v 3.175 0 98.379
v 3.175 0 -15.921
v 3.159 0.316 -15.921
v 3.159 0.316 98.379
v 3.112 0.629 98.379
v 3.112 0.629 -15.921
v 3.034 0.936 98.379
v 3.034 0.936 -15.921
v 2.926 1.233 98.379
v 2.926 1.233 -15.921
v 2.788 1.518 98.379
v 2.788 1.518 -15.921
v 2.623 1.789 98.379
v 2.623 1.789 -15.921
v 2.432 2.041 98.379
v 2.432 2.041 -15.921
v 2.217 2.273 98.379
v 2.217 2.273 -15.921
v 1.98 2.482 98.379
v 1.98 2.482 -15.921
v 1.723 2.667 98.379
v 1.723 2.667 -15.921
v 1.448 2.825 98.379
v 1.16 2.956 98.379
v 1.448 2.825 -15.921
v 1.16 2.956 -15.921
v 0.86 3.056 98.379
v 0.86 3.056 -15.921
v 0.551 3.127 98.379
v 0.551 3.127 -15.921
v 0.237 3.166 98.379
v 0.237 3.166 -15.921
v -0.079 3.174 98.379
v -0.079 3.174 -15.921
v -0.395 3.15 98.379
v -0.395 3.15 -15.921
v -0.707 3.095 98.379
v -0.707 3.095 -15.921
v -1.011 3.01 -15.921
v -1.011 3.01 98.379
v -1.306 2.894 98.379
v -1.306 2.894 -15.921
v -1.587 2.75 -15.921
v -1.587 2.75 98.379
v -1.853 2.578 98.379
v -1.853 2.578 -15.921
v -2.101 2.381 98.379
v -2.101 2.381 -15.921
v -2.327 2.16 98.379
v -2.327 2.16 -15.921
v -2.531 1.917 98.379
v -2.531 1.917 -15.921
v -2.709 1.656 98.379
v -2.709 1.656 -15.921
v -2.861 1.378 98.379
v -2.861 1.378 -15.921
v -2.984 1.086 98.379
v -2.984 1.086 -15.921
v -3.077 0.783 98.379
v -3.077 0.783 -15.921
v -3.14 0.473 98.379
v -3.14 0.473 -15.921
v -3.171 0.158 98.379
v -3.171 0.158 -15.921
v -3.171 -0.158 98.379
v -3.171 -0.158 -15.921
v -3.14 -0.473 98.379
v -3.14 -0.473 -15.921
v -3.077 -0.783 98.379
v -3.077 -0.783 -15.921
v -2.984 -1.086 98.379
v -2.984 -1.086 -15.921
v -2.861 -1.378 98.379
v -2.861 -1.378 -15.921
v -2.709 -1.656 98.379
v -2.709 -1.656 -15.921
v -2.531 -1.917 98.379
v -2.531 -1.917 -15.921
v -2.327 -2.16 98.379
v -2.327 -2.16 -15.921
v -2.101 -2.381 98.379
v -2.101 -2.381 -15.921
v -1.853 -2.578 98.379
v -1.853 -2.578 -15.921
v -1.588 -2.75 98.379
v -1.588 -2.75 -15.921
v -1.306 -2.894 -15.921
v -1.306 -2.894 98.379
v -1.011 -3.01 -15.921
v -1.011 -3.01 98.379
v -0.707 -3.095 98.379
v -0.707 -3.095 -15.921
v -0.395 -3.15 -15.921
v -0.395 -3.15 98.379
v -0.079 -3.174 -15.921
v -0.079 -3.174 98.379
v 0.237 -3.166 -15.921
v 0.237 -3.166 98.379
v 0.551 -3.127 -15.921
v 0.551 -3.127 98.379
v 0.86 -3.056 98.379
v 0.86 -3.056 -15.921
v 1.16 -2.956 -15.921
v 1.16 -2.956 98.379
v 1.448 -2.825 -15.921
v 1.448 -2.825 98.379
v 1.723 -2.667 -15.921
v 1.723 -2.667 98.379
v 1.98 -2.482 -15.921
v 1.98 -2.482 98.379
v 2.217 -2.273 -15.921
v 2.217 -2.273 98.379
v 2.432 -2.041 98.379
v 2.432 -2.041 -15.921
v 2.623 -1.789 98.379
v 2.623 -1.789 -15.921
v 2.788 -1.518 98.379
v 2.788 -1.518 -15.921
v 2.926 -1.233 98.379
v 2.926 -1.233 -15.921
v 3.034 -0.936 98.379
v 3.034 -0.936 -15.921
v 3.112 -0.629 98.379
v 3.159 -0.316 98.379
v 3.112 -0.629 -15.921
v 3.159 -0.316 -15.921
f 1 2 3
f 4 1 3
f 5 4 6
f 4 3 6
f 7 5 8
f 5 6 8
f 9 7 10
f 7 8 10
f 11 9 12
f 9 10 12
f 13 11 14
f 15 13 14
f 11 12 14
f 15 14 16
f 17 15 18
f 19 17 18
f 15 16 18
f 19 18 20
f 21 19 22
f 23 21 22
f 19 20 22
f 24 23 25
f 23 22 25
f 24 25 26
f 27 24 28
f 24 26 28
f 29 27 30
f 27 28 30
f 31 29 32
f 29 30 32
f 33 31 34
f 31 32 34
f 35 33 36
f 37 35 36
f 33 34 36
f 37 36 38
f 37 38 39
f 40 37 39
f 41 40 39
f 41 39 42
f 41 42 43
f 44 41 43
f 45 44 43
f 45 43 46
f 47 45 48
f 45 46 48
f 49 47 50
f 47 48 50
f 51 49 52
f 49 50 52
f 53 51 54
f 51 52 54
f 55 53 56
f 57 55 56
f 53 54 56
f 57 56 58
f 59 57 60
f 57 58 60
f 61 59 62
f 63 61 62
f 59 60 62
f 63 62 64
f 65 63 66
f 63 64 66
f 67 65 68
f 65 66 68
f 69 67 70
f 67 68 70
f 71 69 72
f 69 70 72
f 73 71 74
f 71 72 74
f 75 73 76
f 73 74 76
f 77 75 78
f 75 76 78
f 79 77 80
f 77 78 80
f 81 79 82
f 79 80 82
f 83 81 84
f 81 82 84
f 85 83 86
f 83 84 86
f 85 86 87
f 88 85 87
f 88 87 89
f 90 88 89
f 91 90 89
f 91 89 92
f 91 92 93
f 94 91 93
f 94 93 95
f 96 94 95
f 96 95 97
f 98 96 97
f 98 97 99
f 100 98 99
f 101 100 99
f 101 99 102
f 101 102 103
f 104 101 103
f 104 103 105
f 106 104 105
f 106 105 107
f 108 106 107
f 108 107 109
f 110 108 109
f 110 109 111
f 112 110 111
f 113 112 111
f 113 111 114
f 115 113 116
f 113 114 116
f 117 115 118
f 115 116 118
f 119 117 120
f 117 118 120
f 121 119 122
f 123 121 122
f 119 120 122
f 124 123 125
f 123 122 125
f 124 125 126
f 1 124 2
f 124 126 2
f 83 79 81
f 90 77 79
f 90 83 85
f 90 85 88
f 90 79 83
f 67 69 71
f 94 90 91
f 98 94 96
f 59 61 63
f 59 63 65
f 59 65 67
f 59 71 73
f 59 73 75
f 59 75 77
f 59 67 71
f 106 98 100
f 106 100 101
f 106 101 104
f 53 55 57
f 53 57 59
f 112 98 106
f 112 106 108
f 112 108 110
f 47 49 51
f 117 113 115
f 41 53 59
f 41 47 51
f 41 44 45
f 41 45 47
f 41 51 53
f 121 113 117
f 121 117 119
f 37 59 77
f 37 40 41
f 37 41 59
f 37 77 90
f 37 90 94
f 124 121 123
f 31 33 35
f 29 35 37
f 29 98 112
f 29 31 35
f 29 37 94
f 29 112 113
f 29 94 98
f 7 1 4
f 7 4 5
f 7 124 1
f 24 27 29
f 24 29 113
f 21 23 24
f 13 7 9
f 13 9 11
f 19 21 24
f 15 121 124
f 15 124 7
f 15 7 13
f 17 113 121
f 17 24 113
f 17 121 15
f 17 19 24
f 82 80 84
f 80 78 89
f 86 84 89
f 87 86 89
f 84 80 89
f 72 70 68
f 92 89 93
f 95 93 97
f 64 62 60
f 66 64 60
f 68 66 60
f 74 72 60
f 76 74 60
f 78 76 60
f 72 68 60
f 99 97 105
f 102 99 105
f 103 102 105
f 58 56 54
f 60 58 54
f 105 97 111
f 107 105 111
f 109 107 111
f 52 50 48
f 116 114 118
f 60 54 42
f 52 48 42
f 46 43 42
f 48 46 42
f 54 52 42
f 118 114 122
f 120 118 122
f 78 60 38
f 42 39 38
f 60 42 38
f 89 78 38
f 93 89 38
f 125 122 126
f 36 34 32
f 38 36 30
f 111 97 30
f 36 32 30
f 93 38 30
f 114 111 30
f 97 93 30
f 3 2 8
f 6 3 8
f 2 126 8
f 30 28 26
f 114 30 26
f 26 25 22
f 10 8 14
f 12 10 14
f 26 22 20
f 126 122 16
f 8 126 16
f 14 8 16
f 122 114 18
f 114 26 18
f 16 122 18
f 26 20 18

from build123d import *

# Parameters (mm, degrees)
BOSS_EXTRUDE1_START     = -114.3
BOSS_EXTRUDE1_OUTLINE_R = 3.175
BOSS_EXTRUDE1_DEPTH     = 114.3


# Read off the part's stored shape, not the designer's step: Boss-Extrude1
with BuildPart() as part:
    # Boss-Extrude1 outline → Boss-Extrude1 (new body)
    with BuildSketch(Plane.XY.offset(98.3791731).offset(BOSS_EXTRUDE1_START)):
        Circle(BOSS_EXTRUDE1_OUTLINE_R)
    extrude(amount=BOSS_EXTRUDE1_DEPTH)


solid = part.part
